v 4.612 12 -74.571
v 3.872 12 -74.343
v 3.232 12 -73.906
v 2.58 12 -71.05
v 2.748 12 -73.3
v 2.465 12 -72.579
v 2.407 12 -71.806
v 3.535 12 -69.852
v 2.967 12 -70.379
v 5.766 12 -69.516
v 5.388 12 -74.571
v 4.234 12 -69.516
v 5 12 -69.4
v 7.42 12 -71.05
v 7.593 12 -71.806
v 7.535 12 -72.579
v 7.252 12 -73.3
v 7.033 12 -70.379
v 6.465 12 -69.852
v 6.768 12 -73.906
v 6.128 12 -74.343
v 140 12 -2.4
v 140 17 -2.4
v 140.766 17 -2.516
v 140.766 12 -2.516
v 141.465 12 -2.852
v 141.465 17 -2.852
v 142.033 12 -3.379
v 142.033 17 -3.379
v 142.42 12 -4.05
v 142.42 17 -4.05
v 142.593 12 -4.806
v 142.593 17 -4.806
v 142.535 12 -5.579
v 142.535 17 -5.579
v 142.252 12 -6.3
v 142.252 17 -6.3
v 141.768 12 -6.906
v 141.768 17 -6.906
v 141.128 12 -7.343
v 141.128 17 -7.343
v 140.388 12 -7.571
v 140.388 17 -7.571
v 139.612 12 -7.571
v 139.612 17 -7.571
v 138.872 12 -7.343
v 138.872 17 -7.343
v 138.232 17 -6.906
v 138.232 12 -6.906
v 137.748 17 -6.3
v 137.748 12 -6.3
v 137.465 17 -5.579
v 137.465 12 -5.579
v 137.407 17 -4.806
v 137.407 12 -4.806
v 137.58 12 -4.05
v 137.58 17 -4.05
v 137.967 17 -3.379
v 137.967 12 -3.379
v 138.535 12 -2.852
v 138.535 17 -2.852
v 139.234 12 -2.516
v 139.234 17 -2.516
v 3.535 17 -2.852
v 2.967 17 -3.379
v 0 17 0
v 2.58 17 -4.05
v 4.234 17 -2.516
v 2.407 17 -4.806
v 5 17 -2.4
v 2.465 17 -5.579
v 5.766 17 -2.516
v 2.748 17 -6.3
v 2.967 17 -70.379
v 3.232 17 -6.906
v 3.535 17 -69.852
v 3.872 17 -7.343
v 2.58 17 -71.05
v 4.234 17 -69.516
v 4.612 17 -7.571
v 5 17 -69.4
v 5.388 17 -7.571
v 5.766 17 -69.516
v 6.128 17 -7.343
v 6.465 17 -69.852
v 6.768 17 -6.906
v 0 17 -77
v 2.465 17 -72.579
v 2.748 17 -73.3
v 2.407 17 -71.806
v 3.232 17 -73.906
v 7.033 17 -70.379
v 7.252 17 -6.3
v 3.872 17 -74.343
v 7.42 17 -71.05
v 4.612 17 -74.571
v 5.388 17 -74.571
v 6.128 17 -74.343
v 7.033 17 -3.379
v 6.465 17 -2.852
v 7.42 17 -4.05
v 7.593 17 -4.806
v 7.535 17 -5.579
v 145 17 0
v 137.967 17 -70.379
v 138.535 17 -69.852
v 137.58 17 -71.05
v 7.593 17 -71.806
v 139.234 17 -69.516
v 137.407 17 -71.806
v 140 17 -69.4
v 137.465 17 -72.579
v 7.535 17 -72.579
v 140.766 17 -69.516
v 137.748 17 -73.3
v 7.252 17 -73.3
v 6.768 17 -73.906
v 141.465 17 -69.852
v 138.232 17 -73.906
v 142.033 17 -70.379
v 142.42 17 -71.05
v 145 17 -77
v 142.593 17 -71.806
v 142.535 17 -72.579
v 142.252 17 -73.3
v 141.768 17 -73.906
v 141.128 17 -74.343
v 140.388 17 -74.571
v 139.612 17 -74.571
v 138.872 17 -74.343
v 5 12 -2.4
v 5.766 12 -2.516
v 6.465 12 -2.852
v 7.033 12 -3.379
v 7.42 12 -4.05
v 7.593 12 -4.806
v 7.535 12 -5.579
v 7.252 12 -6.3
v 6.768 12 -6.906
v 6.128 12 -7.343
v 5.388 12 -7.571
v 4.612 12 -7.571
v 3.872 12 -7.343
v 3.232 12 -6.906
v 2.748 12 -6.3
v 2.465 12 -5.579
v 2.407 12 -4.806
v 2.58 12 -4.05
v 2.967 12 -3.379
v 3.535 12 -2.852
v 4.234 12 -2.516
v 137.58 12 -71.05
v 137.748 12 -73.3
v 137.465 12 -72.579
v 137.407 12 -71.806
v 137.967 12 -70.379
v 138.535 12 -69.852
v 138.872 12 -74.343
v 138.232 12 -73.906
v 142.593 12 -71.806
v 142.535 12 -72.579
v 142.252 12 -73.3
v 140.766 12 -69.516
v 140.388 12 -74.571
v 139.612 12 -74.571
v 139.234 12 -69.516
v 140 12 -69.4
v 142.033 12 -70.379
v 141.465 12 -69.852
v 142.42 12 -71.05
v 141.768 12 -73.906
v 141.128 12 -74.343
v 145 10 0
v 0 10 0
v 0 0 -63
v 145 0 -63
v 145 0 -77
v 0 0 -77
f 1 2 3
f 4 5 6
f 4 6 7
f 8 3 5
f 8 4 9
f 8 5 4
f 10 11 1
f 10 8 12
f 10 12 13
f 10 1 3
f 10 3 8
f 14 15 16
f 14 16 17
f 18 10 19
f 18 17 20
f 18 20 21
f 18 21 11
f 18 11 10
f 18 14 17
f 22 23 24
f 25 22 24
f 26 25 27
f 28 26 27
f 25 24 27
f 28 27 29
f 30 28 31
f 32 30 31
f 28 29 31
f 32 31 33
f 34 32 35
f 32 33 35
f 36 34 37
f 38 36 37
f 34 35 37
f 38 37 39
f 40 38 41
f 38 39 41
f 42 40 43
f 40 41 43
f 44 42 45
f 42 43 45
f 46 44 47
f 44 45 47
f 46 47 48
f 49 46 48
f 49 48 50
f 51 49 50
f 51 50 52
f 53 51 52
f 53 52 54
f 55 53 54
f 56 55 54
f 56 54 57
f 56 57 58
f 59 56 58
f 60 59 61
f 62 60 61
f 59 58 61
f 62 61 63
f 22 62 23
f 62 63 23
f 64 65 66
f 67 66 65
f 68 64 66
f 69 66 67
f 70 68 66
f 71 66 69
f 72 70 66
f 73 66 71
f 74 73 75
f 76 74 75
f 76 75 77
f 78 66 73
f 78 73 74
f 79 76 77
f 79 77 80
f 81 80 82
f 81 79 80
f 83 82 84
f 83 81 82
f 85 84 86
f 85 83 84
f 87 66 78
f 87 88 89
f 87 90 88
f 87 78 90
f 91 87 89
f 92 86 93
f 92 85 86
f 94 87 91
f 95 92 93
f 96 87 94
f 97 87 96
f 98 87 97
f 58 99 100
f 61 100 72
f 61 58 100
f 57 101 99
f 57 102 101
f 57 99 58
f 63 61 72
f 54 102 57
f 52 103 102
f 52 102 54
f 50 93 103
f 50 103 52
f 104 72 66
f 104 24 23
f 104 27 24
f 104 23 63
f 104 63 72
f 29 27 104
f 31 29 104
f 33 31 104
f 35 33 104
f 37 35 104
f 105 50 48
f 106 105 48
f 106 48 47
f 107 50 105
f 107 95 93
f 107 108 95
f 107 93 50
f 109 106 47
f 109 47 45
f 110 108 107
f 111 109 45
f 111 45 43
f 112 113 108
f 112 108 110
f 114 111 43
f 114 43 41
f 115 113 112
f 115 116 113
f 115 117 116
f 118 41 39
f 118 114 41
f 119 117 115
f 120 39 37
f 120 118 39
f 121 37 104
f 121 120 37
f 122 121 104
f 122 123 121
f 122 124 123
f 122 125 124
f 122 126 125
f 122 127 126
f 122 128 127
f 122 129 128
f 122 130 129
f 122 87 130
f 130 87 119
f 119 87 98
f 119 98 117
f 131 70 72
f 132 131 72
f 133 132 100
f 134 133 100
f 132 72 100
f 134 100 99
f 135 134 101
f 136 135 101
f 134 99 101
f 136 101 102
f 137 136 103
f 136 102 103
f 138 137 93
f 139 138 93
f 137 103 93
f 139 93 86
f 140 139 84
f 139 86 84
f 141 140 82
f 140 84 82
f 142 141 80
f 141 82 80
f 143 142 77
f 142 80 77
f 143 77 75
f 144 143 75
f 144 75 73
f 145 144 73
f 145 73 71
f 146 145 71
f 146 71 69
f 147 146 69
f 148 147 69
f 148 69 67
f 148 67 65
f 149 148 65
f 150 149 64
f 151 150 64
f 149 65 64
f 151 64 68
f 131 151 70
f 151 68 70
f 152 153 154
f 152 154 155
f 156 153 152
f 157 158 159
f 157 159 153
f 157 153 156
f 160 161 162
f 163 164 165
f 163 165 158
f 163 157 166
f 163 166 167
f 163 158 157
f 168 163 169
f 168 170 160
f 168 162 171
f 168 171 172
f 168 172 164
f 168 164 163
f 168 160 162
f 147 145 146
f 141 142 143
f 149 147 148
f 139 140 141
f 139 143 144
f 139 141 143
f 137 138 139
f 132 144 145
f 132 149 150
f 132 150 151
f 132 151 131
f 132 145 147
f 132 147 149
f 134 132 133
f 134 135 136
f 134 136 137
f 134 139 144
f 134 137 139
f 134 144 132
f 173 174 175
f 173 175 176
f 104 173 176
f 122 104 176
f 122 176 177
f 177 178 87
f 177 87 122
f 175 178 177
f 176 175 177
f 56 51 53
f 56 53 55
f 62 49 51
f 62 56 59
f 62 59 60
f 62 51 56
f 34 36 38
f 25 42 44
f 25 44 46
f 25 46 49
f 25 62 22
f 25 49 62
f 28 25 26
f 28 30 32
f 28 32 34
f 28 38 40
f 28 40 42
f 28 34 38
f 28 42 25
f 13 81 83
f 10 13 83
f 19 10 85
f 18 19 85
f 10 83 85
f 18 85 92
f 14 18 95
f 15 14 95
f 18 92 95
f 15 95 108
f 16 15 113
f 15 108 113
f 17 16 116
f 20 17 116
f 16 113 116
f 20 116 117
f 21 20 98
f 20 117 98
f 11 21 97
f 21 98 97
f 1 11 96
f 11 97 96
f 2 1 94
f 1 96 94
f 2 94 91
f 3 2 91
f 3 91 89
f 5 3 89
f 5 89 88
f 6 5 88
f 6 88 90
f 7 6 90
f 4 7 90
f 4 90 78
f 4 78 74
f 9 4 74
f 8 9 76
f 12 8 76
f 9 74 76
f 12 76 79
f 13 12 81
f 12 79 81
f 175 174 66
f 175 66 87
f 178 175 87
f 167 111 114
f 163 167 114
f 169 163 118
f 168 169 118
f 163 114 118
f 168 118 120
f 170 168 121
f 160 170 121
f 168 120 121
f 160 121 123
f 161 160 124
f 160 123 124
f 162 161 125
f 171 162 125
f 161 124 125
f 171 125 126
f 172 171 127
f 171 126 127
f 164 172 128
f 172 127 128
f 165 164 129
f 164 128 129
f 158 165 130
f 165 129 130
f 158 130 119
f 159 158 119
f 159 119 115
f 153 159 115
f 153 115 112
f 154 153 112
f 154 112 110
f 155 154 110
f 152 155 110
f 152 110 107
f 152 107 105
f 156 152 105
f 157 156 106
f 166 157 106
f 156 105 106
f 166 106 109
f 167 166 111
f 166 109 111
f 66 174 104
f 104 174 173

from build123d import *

# Parameters (mm, degrees)
SKETCH5_W           = 145
SKETCH5_H           = 77
BOSS_EXTRUDE2_DEPTH = 17
CHAMFER2_SIZE       = 63
CHAMFER2_SIZE2      = 10
SKETCH1_R           = 2.6
CUT_EXTRUDE1_DEPTH  = 5


with BuildPart() as part:
    # Sketch5 → Boss-Extrude2 (new body)
    with BuildSketch(Plane(origin=(0, 0, 0), x_dir=(1, 0, 0), z_dir=(0, 1, 0))):
        with Locations((72.5, 38.5)):
            Rectangle(SKETCH5_W, SKETCH5_H)
    extrude(amount=BOSS_EXTRUDE2_DEPTH)

    # Chamfer2
    chamfer2_edges = [part.edges().sort_by_distance(p)[0] for p in [
        (72.5, 0, 0),
    ]]
    chamfer2_side = [part.faces().sort_by_distance(p)[0] for p in [
        (72.5, 0, -38.5),
    ]]
    chamfer(chamfer2_edges, length=CHAMFER2_SIZE, length2=CHAMFER2_SIZE2, reference=chamfer2_side[0])

    # Sketch1 → Cut-Extrude1 (cut)
    with BuildSketch(Plane(origin=(0, 17, 0), x_dir=(1, 0, 0), z_dir=(0, 1, 0))):
        with Locations(Location((5, 72, 0), (0, 0, 270))):
            Circle(SKETCH1_R)
        with Locations(Location((5, 5, 0), (0, 0, 270))):
            Circle(SKETCH1_R)
        with Locations(Location((140, 5, 0), (0, 0, 270))):
            Circle(SKETCH1_R)
        with Locations(Location((140, 72, 0), (0, 0, 270))):
            Circle(SKETCH1_R)
    extrude(amount=-CUT_EXTRUDE1_DEPTH, mode=Mode.SUBTRACT)


solid = part.part
